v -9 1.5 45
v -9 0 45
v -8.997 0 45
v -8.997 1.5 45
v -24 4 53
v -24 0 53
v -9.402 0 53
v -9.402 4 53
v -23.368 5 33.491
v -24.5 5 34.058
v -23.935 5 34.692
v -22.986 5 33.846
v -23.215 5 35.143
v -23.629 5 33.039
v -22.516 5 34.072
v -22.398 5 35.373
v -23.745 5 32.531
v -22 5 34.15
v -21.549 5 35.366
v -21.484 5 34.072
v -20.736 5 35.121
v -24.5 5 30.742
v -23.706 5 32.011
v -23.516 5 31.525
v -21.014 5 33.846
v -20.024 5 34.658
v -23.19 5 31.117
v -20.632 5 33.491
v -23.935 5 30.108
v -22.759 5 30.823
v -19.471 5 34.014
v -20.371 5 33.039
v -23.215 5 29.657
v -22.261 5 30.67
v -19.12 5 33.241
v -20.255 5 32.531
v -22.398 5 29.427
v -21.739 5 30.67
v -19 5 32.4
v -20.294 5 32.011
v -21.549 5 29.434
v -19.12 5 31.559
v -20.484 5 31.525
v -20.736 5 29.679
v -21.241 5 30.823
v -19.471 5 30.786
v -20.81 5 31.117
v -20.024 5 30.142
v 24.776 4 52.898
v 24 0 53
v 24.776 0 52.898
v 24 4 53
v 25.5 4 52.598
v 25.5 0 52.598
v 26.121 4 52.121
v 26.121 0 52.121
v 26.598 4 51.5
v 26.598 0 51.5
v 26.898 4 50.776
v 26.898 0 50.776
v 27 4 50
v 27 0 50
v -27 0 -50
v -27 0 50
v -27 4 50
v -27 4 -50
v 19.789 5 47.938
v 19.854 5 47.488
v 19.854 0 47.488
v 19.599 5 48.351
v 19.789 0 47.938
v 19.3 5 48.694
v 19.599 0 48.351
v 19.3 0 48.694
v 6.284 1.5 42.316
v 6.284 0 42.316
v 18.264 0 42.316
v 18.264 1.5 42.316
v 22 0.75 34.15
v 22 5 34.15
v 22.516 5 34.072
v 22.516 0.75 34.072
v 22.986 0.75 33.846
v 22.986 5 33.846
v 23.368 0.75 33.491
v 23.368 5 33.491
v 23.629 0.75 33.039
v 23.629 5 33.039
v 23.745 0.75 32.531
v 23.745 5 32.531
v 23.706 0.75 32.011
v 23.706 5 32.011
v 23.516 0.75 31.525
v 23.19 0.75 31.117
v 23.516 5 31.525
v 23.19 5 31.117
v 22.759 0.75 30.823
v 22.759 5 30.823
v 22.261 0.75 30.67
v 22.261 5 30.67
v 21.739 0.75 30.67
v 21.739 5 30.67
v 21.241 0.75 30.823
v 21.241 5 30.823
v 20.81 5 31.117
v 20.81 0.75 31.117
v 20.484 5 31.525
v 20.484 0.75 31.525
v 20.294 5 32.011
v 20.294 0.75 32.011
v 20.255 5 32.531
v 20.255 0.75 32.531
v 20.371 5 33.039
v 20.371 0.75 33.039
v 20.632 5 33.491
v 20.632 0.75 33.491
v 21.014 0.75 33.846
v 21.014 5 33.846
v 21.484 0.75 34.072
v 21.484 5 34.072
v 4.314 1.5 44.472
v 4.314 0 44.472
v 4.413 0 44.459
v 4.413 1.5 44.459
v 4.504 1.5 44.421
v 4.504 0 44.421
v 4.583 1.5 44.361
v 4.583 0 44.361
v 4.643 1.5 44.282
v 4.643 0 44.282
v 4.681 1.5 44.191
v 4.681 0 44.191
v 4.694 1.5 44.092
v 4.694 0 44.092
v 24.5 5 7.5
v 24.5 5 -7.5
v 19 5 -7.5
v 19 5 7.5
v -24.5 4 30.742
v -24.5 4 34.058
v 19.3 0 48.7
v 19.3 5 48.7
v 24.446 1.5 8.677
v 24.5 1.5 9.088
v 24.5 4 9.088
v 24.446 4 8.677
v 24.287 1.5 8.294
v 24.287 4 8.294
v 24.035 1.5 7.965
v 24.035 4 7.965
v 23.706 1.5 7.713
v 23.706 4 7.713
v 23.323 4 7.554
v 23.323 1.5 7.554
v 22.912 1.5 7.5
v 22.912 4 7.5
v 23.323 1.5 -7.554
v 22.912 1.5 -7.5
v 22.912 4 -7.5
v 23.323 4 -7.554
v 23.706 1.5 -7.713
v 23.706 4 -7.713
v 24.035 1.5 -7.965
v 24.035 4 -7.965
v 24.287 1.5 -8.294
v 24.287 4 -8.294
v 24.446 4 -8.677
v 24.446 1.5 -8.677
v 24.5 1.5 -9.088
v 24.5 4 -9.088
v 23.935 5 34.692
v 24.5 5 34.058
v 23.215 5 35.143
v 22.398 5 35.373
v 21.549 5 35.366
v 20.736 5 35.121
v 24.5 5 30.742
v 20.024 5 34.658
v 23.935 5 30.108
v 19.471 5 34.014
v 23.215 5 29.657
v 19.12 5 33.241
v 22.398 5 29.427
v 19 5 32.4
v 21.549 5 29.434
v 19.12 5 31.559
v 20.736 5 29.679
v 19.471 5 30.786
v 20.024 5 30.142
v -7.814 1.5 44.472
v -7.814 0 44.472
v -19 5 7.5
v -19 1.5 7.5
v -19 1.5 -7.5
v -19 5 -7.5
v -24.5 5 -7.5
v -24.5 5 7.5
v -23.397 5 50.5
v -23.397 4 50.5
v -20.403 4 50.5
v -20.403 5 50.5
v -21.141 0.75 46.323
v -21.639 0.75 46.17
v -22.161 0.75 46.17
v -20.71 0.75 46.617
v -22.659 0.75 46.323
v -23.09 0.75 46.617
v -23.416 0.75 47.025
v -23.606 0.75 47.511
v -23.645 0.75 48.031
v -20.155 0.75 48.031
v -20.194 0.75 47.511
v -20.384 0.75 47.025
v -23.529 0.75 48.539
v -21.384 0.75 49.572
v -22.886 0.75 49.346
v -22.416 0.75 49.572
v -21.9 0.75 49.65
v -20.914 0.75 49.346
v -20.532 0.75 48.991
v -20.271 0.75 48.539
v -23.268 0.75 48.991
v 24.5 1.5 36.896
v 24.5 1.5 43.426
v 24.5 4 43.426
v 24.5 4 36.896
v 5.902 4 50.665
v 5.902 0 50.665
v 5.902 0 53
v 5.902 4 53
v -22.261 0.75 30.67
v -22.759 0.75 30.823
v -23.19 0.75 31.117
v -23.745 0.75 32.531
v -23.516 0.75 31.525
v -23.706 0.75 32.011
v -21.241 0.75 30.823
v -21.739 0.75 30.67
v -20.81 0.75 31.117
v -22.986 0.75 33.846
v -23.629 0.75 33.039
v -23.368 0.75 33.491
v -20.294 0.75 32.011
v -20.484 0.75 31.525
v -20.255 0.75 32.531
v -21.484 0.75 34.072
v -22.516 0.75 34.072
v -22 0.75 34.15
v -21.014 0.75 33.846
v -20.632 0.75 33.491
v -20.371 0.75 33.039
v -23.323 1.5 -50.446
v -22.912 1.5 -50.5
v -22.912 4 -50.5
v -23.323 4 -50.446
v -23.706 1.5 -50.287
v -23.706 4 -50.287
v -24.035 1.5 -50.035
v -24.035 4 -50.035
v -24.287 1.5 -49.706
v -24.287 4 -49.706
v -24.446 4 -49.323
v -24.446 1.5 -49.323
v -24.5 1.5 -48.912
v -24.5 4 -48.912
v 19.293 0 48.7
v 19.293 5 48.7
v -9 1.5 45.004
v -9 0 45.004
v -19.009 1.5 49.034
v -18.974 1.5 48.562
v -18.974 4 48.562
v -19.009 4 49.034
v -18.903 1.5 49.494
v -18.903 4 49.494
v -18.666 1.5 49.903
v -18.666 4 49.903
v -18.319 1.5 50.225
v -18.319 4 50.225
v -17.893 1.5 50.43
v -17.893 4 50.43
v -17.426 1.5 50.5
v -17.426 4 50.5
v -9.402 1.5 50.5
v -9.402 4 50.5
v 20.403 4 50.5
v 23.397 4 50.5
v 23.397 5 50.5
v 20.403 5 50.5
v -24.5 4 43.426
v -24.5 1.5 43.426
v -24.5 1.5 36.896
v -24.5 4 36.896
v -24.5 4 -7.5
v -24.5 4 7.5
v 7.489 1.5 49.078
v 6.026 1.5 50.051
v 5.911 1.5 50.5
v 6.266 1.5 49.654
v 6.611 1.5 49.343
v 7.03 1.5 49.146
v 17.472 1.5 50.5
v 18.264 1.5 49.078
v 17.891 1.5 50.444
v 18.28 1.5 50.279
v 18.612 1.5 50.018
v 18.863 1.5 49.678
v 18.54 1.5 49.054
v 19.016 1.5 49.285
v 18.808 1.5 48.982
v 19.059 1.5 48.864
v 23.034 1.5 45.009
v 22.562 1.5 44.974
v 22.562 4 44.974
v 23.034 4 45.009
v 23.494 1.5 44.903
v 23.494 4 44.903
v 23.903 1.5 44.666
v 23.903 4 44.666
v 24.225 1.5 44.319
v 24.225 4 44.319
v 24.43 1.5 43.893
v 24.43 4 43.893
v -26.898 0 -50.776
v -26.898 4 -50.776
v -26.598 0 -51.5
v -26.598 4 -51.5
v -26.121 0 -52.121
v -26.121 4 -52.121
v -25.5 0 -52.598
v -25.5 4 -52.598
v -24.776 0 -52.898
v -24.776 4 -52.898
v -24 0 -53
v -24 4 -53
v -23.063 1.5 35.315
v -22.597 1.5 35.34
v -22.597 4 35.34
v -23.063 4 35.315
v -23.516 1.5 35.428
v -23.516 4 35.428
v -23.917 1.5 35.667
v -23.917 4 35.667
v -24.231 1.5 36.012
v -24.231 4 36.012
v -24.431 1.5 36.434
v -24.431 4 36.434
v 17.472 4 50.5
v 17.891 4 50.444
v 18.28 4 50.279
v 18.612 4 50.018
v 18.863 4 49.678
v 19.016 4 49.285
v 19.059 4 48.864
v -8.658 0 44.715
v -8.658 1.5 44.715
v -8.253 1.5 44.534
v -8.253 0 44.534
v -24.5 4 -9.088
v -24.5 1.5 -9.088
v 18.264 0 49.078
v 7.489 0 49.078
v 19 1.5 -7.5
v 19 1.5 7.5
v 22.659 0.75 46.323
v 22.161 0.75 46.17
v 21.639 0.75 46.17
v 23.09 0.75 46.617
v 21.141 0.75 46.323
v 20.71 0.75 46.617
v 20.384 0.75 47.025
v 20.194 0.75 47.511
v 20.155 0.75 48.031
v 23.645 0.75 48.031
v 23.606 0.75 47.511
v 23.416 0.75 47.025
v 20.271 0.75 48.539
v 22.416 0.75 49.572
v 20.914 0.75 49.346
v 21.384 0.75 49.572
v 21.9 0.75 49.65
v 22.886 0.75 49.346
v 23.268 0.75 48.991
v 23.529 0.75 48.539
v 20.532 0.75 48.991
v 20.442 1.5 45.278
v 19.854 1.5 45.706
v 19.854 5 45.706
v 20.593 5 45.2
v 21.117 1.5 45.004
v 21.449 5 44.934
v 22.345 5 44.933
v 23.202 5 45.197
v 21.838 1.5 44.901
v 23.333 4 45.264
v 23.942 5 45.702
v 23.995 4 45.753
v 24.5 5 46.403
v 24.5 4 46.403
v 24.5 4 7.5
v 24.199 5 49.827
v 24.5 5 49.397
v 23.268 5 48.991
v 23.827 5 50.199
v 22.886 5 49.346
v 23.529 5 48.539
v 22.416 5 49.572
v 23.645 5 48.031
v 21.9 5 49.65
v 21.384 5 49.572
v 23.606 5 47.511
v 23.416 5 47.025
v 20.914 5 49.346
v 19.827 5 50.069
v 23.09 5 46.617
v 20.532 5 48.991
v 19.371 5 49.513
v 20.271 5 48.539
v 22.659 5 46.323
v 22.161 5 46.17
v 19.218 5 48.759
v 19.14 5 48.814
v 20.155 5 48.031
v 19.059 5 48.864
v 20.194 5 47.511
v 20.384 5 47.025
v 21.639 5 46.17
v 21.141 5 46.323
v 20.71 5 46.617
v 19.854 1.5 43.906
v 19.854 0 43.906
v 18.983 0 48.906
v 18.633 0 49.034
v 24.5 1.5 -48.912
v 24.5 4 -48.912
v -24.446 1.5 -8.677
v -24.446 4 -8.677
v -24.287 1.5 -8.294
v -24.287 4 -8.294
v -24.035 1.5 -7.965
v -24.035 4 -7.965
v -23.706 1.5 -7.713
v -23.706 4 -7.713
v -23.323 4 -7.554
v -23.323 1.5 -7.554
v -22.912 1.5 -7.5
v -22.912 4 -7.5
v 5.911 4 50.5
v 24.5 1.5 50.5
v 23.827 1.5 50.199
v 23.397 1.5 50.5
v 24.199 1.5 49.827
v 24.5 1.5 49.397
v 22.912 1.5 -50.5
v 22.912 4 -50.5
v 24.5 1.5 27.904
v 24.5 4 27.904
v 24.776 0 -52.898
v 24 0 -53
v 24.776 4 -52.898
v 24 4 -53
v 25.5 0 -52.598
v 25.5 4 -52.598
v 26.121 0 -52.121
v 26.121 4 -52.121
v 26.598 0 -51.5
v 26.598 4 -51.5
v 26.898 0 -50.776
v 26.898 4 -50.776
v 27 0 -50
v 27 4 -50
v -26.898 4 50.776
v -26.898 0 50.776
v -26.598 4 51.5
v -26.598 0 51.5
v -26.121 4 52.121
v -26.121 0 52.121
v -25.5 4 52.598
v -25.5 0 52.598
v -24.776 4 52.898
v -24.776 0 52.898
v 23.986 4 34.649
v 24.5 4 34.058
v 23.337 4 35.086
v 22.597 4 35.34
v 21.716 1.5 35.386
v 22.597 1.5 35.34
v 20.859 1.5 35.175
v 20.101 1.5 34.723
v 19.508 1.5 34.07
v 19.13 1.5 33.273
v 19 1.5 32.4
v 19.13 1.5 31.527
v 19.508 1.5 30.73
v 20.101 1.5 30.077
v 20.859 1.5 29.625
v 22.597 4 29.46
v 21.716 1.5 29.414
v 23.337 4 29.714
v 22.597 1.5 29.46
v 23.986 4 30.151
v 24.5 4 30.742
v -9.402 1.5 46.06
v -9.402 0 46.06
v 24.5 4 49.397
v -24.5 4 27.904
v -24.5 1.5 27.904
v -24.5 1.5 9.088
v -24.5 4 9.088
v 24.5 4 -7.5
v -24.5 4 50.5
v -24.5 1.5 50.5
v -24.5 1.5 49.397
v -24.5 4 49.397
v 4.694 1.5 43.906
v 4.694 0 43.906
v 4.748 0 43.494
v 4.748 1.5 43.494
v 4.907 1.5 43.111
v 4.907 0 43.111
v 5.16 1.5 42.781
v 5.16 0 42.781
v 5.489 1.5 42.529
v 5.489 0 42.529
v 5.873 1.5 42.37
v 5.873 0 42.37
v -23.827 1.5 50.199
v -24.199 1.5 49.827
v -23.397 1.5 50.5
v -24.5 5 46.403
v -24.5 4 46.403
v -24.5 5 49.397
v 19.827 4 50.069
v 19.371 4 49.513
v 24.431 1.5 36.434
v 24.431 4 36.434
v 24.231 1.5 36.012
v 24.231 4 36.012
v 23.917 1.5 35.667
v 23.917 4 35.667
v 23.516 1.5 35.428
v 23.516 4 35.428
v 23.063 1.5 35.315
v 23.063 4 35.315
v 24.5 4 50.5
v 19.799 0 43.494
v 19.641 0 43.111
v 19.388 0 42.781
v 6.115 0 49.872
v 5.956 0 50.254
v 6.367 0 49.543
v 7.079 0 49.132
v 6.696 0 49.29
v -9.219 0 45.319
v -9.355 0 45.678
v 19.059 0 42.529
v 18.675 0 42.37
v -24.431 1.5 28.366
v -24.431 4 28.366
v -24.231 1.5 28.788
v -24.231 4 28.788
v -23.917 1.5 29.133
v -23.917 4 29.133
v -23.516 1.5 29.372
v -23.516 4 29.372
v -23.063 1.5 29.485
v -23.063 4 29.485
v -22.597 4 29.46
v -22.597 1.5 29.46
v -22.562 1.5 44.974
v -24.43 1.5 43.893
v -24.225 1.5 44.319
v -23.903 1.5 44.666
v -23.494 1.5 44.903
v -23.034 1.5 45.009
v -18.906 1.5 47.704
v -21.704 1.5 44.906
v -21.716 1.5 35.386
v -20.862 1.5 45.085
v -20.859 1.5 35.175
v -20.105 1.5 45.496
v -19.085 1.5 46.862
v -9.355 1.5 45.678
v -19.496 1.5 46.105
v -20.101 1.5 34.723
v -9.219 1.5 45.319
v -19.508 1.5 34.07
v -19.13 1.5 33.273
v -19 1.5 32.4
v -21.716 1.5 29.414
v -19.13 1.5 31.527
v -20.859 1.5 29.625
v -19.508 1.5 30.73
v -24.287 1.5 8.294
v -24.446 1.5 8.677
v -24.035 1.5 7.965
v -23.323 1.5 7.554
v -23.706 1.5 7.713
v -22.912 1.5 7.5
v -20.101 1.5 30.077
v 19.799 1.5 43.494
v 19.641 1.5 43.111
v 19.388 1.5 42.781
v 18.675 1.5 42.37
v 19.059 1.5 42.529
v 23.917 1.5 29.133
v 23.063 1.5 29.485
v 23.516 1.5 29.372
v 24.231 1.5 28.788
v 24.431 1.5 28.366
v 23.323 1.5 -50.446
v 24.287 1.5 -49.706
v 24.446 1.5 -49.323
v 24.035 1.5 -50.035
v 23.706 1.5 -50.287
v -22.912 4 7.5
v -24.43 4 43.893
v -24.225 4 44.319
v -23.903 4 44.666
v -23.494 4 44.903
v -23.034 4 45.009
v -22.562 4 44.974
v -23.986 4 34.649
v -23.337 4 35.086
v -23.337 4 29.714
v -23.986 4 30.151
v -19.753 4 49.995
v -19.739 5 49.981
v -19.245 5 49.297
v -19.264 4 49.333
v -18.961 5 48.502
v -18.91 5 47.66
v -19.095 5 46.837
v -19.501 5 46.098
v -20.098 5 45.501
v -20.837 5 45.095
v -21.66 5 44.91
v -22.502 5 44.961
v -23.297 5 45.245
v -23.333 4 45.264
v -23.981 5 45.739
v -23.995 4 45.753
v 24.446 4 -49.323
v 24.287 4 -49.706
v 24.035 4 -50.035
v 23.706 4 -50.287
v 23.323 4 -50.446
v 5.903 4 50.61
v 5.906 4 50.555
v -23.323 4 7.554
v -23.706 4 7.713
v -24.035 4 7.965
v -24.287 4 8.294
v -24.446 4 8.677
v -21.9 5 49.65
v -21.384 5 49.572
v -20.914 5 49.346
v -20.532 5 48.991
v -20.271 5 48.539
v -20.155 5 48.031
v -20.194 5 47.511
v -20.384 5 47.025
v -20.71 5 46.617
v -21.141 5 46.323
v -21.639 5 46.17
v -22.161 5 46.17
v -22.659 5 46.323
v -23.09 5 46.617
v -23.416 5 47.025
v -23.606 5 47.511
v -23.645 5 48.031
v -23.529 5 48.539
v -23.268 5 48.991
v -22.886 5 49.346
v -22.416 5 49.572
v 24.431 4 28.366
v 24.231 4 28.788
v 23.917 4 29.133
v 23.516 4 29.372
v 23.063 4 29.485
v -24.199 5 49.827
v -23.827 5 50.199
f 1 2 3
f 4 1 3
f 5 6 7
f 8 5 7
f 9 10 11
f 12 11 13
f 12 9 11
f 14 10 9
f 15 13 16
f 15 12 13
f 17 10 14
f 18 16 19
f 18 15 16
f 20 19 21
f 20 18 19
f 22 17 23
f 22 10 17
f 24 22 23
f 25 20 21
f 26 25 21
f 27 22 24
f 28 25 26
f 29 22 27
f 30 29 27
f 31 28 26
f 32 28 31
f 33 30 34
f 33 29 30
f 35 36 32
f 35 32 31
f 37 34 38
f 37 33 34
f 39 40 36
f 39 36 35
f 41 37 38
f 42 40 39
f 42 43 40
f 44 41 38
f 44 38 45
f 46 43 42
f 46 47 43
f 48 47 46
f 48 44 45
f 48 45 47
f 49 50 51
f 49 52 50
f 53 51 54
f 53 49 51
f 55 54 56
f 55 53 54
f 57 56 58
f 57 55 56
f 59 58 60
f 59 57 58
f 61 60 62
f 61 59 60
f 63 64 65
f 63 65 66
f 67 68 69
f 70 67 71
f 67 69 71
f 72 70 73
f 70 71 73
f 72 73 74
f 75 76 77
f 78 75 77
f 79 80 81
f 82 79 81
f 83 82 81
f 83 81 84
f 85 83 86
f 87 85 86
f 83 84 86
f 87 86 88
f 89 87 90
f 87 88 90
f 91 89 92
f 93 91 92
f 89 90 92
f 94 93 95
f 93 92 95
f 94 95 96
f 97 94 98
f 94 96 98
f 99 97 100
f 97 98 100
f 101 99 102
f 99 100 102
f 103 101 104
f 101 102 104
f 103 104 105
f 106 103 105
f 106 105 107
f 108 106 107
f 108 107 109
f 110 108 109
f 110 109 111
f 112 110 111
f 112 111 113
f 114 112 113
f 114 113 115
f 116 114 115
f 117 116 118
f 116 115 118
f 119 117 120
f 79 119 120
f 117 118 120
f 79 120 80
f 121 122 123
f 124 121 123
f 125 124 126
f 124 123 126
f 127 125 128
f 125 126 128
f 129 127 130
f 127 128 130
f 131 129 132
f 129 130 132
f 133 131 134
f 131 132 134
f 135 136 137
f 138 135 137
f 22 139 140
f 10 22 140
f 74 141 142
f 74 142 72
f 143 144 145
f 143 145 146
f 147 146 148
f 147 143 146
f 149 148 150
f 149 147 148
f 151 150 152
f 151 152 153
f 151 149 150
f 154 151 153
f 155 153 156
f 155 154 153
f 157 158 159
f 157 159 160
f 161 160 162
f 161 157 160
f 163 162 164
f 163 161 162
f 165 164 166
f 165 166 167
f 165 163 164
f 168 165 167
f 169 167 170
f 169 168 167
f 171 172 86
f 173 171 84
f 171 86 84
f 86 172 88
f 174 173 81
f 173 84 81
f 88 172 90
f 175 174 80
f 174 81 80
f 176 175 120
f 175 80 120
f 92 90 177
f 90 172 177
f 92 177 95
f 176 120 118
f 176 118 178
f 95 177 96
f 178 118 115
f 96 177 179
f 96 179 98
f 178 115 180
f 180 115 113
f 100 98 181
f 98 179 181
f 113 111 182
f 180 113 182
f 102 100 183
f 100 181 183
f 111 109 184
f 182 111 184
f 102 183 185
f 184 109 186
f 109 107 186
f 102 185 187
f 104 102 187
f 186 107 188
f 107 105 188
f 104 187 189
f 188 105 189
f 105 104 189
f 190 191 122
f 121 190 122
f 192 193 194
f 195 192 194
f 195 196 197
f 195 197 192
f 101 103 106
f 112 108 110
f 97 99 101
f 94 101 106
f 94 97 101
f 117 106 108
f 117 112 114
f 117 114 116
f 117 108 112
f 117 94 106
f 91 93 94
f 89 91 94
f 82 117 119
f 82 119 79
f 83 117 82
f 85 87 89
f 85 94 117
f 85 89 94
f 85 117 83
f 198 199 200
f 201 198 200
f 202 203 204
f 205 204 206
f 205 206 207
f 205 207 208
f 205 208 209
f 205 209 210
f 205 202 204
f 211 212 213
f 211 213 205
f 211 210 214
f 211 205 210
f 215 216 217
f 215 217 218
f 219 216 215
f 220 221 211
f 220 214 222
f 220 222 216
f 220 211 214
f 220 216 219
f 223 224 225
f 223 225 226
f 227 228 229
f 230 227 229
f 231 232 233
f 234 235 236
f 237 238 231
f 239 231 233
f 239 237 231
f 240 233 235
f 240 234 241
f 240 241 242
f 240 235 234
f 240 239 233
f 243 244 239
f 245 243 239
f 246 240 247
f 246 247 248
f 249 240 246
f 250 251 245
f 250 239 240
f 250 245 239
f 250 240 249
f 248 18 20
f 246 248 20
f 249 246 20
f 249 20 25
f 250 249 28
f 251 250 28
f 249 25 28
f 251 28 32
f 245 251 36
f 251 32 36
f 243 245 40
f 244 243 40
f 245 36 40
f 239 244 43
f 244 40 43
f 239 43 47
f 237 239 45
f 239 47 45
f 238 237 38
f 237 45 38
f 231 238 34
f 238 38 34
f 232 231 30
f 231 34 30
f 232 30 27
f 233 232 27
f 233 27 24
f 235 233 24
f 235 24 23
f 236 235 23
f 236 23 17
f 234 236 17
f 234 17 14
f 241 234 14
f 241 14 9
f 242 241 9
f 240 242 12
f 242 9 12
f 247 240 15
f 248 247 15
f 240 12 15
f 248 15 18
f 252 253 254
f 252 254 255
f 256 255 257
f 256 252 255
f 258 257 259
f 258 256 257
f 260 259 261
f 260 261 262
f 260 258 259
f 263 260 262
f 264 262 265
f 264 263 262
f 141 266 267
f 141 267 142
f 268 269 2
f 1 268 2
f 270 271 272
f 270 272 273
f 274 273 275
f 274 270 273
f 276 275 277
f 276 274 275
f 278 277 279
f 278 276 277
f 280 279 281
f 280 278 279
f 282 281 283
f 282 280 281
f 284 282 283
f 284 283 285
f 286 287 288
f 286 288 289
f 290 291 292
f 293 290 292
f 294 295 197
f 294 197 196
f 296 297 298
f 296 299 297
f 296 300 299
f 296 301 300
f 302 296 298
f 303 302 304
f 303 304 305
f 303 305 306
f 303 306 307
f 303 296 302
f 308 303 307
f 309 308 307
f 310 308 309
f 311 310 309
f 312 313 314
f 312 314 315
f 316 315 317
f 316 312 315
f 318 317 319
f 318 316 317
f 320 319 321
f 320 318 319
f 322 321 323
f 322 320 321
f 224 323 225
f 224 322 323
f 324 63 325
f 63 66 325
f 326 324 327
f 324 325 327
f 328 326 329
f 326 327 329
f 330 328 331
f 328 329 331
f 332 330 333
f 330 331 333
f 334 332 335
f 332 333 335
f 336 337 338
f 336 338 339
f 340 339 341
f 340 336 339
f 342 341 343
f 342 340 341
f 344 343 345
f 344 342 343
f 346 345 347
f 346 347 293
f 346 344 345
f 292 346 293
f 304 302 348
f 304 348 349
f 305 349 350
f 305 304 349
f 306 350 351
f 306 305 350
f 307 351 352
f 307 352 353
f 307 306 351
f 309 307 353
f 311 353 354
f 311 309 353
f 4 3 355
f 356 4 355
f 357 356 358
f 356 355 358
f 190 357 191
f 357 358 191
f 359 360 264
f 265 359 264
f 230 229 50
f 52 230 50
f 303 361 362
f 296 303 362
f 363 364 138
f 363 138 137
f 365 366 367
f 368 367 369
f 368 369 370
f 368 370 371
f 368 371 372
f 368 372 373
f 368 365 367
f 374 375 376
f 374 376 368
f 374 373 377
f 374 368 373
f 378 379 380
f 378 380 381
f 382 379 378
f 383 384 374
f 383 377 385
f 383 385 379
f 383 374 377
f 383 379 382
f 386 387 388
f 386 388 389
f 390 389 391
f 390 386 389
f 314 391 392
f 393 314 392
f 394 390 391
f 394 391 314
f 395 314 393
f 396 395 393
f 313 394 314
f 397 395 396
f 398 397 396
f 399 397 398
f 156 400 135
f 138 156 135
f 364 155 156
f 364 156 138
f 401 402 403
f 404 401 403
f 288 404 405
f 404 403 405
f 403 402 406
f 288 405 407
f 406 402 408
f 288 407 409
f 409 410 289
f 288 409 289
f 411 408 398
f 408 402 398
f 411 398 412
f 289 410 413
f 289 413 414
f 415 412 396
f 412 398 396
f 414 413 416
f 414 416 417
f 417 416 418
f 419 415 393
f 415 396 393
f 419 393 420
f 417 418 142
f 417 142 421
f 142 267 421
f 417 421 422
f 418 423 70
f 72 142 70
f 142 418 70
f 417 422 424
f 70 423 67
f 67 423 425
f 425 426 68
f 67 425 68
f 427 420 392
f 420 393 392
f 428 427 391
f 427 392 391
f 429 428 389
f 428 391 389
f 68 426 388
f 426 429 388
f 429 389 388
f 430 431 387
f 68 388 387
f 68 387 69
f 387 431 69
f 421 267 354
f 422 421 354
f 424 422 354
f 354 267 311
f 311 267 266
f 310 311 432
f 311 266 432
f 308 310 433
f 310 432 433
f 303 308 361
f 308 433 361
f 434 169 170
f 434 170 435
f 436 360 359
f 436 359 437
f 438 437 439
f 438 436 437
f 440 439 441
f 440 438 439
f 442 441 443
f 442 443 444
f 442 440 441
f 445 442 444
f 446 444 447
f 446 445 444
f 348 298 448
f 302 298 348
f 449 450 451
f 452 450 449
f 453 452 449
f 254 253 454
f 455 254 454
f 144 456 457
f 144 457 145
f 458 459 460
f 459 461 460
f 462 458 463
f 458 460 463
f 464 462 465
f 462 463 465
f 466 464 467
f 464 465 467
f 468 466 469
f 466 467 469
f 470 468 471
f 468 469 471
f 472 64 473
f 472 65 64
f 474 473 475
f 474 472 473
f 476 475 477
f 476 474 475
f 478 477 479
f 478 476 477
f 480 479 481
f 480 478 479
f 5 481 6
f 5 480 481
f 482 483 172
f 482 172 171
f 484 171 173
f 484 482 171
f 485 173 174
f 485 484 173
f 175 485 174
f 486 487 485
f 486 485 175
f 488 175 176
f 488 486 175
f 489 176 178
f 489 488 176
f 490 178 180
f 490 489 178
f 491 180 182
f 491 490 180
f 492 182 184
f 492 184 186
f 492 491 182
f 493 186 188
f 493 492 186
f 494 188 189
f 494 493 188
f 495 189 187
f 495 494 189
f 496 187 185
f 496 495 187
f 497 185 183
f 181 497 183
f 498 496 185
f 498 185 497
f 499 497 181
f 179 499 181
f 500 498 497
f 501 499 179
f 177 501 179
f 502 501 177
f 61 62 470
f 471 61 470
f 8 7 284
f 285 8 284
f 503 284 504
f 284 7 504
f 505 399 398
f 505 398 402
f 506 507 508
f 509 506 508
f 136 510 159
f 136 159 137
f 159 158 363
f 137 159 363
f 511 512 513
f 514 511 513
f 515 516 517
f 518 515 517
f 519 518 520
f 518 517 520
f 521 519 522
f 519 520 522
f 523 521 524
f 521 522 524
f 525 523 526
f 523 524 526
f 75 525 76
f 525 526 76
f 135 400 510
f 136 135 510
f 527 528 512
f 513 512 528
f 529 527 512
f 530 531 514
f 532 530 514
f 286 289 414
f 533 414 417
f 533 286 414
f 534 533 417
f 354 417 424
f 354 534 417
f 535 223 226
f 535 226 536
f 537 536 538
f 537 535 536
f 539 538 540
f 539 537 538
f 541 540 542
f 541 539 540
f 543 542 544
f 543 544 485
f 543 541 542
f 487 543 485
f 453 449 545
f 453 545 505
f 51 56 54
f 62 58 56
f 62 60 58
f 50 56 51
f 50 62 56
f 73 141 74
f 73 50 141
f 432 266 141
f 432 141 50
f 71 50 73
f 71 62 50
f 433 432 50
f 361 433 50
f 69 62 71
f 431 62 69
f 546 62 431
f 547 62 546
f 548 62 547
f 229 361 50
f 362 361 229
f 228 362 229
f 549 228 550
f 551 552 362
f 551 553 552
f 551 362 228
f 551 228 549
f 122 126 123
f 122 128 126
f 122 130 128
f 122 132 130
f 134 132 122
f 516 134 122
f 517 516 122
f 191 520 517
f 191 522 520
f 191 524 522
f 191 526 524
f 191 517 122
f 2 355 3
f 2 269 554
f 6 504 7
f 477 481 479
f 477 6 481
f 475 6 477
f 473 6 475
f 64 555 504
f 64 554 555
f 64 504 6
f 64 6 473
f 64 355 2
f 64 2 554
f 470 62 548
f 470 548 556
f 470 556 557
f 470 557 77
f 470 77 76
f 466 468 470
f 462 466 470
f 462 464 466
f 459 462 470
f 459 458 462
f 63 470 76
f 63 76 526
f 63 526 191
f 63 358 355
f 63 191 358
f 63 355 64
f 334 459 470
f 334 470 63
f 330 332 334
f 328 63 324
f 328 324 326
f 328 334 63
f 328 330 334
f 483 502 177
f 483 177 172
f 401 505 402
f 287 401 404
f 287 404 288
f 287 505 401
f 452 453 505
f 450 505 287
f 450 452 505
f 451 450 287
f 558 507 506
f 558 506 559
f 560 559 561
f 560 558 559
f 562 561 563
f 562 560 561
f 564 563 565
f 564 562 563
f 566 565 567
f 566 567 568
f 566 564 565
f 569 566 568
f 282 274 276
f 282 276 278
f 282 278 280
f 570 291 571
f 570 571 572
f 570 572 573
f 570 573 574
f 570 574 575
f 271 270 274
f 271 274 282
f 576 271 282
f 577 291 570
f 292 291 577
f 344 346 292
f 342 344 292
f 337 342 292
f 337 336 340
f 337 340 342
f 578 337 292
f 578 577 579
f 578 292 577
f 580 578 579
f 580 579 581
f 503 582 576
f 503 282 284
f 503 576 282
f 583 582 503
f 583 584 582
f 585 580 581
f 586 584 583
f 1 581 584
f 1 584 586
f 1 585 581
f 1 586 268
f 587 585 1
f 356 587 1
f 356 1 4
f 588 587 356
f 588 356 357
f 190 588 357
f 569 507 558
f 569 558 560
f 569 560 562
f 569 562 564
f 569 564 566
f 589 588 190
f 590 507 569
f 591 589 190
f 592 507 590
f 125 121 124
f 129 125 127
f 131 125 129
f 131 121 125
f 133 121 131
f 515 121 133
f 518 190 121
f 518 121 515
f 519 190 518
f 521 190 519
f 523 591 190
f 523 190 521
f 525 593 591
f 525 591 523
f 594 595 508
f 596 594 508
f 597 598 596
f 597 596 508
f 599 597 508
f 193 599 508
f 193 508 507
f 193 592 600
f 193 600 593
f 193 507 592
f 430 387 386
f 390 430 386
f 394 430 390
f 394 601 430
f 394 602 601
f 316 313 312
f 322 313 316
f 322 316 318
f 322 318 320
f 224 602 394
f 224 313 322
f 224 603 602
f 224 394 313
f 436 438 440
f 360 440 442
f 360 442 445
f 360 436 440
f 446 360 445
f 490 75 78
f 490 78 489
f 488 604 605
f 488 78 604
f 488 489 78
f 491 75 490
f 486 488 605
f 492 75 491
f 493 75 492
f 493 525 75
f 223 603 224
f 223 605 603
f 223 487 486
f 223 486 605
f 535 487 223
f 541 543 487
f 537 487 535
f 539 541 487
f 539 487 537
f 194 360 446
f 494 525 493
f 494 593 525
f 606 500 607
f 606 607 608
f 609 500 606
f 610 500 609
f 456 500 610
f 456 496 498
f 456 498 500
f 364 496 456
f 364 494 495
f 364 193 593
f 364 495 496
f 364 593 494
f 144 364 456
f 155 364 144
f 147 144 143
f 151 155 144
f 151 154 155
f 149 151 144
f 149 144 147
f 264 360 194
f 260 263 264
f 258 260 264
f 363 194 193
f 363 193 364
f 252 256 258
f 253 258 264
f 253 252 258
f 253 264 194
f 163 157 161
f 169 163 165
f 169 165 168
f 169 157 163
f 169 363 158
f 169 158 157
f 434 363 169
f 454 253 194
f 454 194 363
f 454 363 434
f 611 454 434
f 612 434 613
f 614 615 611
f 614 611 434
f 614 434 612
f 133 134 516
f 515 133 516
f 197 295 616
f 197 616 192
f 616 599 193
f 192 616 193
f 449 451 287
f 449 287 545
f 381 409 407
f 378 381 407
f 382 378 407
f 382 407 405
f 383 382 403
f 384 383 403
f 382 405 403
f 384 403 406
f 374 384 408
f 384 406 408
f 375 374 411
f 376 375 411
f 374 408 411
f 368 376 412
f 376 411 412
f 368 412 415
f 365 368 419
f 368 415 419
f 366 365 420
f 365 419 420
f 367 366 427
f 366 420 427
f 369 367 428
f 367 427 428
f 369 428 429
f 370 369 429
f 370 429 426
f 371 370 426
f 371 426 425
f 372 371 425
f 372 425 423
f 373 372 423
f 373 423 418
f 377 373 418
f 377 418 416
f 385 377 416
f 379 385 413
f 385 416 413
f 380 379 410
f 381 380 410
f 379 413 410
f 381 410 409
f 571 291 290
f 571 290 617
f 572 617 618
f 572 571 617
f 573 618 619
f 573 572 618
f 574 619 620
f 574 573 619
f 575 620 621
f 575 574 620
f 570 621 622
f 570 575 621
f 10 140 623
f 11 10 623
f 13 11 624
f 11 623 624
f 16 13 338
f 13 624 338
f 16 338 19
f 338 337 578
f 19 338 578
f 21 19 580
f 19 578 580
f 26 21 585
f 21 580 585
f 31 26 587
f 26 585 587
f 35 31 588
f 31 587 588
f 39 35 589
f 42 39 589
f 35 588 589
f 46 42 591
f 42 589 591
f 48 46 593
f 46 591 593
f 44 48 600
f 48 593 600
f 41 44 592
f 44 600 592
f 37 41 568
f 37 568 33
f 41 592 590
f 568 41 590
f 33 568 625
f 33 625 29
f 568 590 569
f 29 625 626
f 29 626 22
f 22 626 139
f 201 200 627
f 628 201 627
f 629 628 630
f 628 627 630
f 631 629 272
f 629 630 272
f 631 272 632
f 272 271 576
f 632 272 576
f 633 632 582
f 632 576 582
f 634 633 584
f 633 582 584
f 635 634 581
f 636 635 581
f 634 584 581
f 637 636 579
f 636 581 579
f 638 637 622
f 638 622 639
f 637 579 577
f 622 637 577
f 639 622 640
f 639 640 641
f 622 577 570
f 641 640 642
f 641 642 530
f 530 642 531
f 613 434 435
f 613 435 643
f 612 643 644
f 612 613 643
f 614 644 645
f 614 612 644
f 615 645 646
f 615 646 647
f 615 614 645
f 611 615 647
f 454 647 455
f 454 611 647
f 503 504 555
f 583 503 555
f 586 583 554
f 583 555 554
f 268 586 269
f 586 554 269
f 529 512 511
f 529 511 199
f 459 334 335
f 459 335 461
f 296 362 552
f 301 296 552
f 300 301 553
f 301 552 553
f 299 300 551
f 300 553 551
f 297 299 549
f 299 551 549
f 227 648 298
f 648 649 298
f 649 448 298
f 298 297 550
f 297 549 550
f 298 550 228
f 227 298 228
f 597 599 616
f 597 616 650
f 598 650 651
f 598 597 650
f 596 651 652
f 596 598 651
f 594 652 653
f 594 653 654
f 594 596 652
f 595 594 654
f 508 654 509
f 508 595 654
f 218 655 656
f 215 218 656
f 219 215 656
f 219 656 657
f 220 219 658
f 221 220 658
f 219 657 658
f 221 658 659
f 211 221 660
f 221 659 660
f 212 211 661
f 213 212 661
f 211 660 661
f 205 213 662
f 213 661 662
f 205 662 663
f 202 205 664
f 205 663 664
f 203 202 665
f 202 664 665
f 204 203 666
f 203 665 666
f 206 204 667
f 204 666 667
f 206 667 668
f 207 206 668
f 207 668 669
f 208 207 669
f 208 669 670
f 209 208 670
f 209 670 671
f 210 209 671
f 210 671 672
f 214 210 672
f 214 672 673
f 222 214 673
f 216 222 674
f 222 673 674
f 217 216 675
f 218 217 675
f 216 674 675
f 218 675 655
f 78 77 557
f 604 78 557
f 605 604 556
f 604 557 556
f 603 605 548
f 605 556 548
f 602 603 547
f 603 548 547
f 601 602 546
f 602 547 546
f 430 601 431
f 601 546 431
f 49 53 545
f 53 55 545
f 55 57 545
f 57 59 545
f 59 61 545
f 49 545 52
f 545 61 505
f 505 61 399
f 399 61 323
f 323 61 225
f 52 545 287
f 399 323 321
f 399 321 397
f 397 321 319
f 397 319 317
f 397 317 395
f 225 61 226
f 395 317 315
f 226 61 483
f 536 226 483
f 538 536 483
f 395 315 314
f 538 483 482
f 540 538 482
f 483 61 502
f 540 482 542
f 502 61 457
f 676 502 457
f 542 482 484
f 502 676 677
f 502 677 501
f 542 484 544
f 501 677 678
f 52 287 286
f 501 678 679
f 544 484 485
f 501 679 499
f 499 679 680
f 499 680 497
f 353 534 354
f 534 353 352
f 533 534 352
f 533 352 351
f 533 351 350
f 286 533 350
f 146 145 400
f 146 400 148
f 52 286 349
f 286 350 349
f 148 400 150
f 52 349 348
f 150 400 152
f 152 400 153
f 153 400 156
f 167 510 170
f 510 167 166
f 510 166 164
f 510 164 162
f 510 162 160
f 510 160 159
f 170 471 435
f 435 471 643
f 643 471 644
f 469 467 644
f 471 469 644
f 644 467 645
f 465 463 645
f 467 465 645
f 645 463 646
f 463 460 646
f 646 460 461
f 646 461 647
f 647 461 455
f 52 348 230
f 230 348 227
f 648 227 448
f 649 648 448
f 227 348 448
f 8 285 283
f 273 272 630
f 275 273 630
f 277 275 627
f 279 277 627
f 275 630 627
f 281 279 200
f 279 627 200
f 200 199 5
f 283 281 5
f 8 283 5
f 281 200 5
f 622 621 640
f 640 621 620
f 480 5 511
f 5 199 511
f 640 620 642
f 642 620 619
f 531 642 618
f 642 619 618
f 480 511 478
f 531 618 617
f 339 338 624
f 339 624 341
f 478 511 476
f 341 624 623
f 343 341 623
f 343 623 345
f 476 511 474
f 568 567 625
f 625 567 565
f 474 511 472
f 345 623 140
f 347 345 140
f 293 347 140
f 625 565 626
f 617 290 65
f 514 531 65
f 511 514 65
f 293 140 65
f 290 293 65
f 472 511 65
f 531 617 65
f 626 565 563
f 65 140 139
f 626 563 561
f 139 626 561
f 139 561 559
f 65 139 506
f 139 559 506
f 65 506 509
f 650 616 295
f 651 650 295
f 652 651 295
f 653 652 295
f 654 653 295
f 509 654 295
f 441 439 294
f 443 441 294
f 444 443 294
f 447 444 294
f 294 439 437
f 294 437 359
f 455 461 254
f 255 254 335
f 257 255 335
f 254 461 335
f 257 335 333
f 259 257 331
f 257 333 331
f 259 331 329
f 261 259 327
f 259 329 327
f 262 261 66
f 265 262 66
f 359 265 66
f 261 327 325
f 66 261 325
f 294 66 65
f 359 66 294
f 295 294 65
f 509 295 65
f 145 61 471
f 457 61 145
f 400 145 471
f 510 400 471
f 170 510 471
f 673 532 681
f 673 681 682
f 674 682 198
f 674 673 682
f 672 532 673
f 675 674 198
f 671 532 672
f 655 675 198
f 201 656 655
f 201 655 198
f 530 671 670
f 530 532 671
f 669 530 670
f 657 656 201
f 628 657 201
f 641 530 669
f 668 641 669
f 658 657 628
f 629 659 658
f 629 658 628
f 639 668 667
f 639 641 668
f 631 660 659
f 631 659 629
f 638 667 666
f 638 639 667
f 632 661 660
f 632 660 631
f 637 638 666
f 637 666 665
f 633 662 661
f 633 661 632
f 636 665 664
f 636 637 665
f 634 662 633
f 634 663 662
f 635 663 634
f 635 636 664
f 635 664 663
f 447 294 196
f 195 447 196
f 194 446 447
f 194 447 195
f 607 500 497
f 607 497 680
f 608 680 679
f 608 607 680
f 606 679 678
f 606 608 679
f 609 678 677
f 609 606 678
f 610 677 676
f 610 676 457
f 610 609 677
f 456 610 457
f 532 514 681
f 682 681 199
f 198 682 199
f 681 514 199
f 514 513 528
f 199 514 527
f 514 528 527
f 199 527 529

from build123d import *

# Parameters (mm, degrees)
SKETCH1_W           = 49
SKETCH1_H           = 101
BOSS_EXTRUDE1_DEPTH = 1.5
SKETCH2_W           = 54
SKETCH2_H           = 106
SKETCH2_W_2         = 49
SKETCH2_H_2         = 101
BOSS_EXTRUDE2_DEPTH = 4
SKETCH3_W           = 5.5
SKETCH3_H           = 15
BOSS_EXTRUDE3_DEPTH = 5
SKETCH4_R           = 1.75
CUT_EXTRUDE1_DEPTH  = 4.25
SKETCH5_R           = 1.75
CUT_EXTRUDE2_DEPTH  = 4.25
SKETCH6_W           = 14.5
SKETCH6_H           = 7.3
CUT_EXTRUDE3_DEPTH  = 60.690870324
SKETCH7_W           = 13.8
SKETCH7_H           = 6
CUT_EXTRUDE4_DEPTH  = 60.690870324
FILLET1_R           = 3
CUT_EXTRUDE5_DEPTH  = 60.690870324
FILLET2_R           = 1.5875


with BuildPart() as part:
    # Sketch1 → Boss-Extrude1 (new body)
    with BuildSketch(Plane(origin=(0, 0, 0), x_dir=(1, 0, 0), z_dir=(0, 1, 0))):
        Rectangle(SKETCH1_W, SKETCH1_H)
    extrude(amount=BOSS_EXTRUDE1_DEPTH)

    # Sketch2 → Boss-Extrude2 (add)
    with BuildSketch(Plane(origin=(0, 0, 0), x_dir=(1, 0, 0), z_dir=(0, 1, 0))):
        Rectangle(SKETCH2_W, SKETCH2_H)
        Rectangle(SKETCH2_W_2, SKETCH2_H_2, mode=Mode.SUBTRACT)
    extrude(amount=BOSS_EXTRUDE2_DEPTH)

    # Sketch3 → Boss-Extrude3 (add)
    with BuildSketch(Plane(origin=(0, 0, 0), x_dir=(1, 0, 0), z_dir=(0, 1, 0))):
        with BuildLine():
            Line((-24.5, -30.741687605), (-24.5, -34.058312395))
            ThreePointArc((-24.5, -34.058312395), (-19, -32.4), (-24.5, -30.741687605))
        make_face()
        with Locations((-21.75, 0)):
            Rectangle(SKETCH3_W, SKETCH3_H)
        with BuildLine():
            Line((-24.5, -46.403337045), (-24.5, -49.396662955))
            ThreePointArc((-24.5, -49.396662955), (-24.021320344, -50.021320344), (-23.396662955, -50.5))
            Line((-23.396662955, -50.5), (-20.403337045, -50.5))
            ThreePointArc((-20.403337045, -50.5), (-19.778679656, -45.778679656), (-24.5, -46.403337045))
        make_face()
    boss_extrude3 = extrude(amount=BOSS_EXTRUDE3_DEPTH)

    # Mirror1: Boss-Extrude3 across plane
    add(boss_extrude3.mirror(Plane(origin=(0, 0, 0), x_dir=(0, 0, 1), z_dir=(1, 0, 0))))

    # Sketch4 → Cut-Extrude1 (cut)
    with BuildSketch(Plane(origin=(0, 5, 0), x_dir=(1, 0, 0), z_dir=(0, 1, 0))):
        with Locations(Location((-21.9, -47.9, 0), (0, 0, 270))):
            Circle(SKETCH4_R)
        with Locations(Location((21.9, -47.9, 0), (0, 0, 270))):
            Circle(SKETCH4_R)
    extrude(amount=-CUT_EXTRUDE1_DEPTH, mode=Mode.SUBTRACT)

    # Sketch5 → Cut-Extrude2 (cut)
    with BuildSketch(Plane(origin=(0, 5, 0), x_dir=(1, 0, 0), z_dir=(0, 1, 0))):
        with Locations(Location((-22, -32.4, 0), (0, 0, 270))):
            Circle(SKETCH5_R)
        with Locations(Location((22, -32.4, 0), (0, 0, 270))):
            Circle(SKETCH5_R)
    extrude(amount=-CUT_EXTRUDE2_DEPTH, mode=Mode.SUBTRACT)

    # Sketch6 → Cut-Extrude3 (cut, through all)
    with BuildSketch(Plane(origin=(0, 0, 0), x_dir=(1, 0, 0), z_dir=(0, 1, 0))):
        with Locations((-1.75, -48.65)):
            Rectangle(SKETCH6_W, SKETCH6_H)
    extrude(amount=CUT_EXTRUDE3_DEPTH, mode=Mode.SUBTRACT)

    # Sketch7 → Cut-Extrude4 (cut, through all)
    with BuildSketch(Plane(origin=(0, 0, 0), x_dir=(1, 0, 0), z_dir=(0, 1, 0))):
        with Locations((12.4, -45.7)):
            Rectangle(SKETCH7_W, SKETCH7_H)
    extrude(amount=CUT_EXTRUDE4_DEPTH, mode=Mode.SUBTRACT)

    # Fillet1
    fillet1_edges = [part.edges().sort_by_distance(p)[0] for p in [
        (-27, 2, 53),
        (27, 2, 53),
        (27, 2, -53),
        (-27, 2, -53),
    ]]
    fillet(fillet1_edges, radius=FILLET1_R)

    # Sketch9 → Cut-Extrude5 (cut, through all)
    with BuildSketch(Plane(origin=(0, 0, 0), x_dir=(1, 0, 0), z_dir=(0, 1, 0))):
        with BuildLine():
            Line((-7.814445172, -44.472009202), (4.314445172, -44.472009202))
            ThreePointArc((4.314445172, -44.472009202), (4.582924338, -44.36080149), (4.69413205, -44.092322323))
            Line((4.69413205, -44.092322323), (4.69413205, -43.905796609))
            ThreePointArc((4.69413205, -43.905796609), (5.159832268, -42.781496827), (6.28413205, -42.315796609))
            Line((6.28413205, -42.315796609), (18.263585731, -42.315796609))
            ThreePointArc((18.263585731, -42.315796609), (19.387885513, -42.781496827), (19.853585731, -43.905796609))
            Line((19.853585731, -43.905796609), (19.853585731, -47.487814705))
            ThreePointArc((19.853585731, -47.487814705), (19.387885513, -48.612114487), (18.263585731, -49.077814705))
            Line((18.263585731, -49.077814705), (7.489445172, -49.077814705))
            ThreePointArc((7.489445172, -49.077814705), (6.366913156, -49.54278269), (5.901945172, -50.665314705))
            Line((5.901945172, -50.665314705), (5.901945172, -53))
            Line((5.901945172, -53), (-9.401945172, -53))
            Line((-9.401945172, -53), (-9.401945172, -46.059509202))
            ThreePointArc((-9.401945172, -46.059509202), (-8.936977187, -44.936977187), (-7.814445172, -44.472009202))
        make_face()
    extrude(amount=CUT_EXTRUDE5_DEPTH, mode=Mode.SUBTRACT)

    # Fillet2
    # the kernel refuses this fillet: 1.5875 mm, written as the material it adds along each edge
    with BuildSketch(Plane(origin=(20.403337045, 1.5, 50.5), x_dir=(-0.6349026308265473, 0, -0.7725921623790454), z_dir=(0, 1, 0))) as fillet2_piece_1:
        with BuildLine():
            CenterArc((3.087304614, 1.256456201), FILLET2_R, 140.587236848, 91.735718276)
            Line((1.860814556, 2.264364128), (0, 0))
            ThreePointArc((0, 0), (1.058504375, 0.192943091), (2.11700875, 0))
        make_face()
    extrude(amount=2.5)
    with BuildSketch(Plane(origin=(24.5, 1.5, 46.403337045), x_dir=(-0.8047683960868028, 0, -0.5935889391320183), z_dir=(0, 1, 0))) as fillet2_piece_2:
        with BuildLine():
            CenterArc((3.045104664, -1.45404326), FILLET2_R, 113.661459125, 102.750646884)
            Line((1.767534835, -2.396365701), (0, 0))
            ThreePointArc((0, 0), (1.203995254, -0.252201713), (2.407990509, 0))
        make_face()
    extrude(amount=2.5)
    with BuildSketch(Plane(origin=(24.5, 1.5, 34.058312395), x_dir=(-0.8294476443903582, 0, 0.5585844656050558), z_dir=(0, 1, 0)), Plane(origin=(-24.5, 1.5, 30.741687605), x_dir=(0.8294476443903578, 0, -0.5585844656050566), z_dir=(0, 1, 0))) as fillet2_piece_3:
        with BuildLine():
            CenterArc((2.901742174, 1.466820617), FILLET2_R, 146.042039471, 101.473230821)
            Line((1.584994038, 2.353573457), (0, 0))
            ThreePointArc((0, 0), (1.147311568, 0.228055526), (2.294623136, 0))
        make_face()
    extrude(amount=2.5)
    with BuildSketch(Plane(origin=(24.5, 1.5, 30.741687605), x_dir=(-0.8294476443903573, 0, -0.5585844656050574), z_dir=(0, 1, 0)), Plane(origin=(-24.5, 1.5, 34.058312395), x_dir=(0.8294476443903588, 0, 0.5585844656050553), z_dir=(0, 1, 0))) as fillet2_piece_4:
        with BuildLine():
            CenterArc((2.901742174, -1.466820617), FILLET2_R, 112.484729709, 101.473230821)
            Line((1.584994038, -2.353573457), (0, 0))
            ThreePointArc((0, 0), (1.147311568, -0.228055526), (2.294623136, 0))
        make_face()
    extrude(amount=2.5)
    with BuildSketch(Plane(origin=(24.5, 1.5, -7.5), x_dir=(-1, 0, 0), z_dir=(0, 1, 0)), Plane(origin=(-24.5, 1.5, 7.5), x_dir=(1, 0, 0), z_dir=(0, 1, 0))) as fillet2_piece_5:
        with BuildLine():
            CenterArc((FILLET2_R, -FILLET2_R), FILLET2_R, 90, 90)
            Line((0, -FILLET2_R), (0, 0))
            Line((0, 0), (FILLET2_R, 0))
        make_face()
    extrude(amount=2.5)
    with BuildSketch(Plane(origin=(24.5, 1.5, 7.5), x_dir=(-1, 0, 0), z_dir=(0, 1, 0)), Plane(origin=(24.5, 1.5, -50.5), x_dir=(-1, 0, 0), z_dir=(0, 1, 0)), Plane(origin=(-24.5, 1.5, -50.5), x_dir=(0, 0, 1), z_dir=(0, 1, 0)), Plane(origin=(-24.5, 1.5, -7.5), x_dir=(1, 0, 0), z_dir=(0, 1, 0))) as fillet2_piece_6:
        with BuildLine():
            CenterArc((FILLET2_R, FILLET2_R), FILLET2_R, 180, 90)
            Line((0, FILLET2_R), (0, 0))
            Line((0, 0), (FILLET2_R, 0))
        make_face()
    extrude(amount=2.5)
    with BuildSketch(Plane(origin=(-20.403337045, 1.5, 50.5), x_dir=(1, 0, 0), z_dir=(0, 1, 0))) as fillet2_piece_7:
        with BuildLine():
            CenterArc((2.97770851, 1.5875), FILLET2_R, 167.249353116, 102.750646884)
            ThreePointArc((1.429356531, 1.937874659), (0.917642234, 0.819233183), (0, 0))
            Line((0, 0), (2.97770851, 0))
        make_face()
    extrude(amount=2.5)
    with BuildSketch(Plane(origin=(-24.5, 1.5, 46.403337045), x_dir=(0.8047683960868005, 0, -0.5935889391320214), z_dir=(0, 1, 0))) as fillet2_piece_8:
        with BuildLine():
            CenterArc((3.045104664, 1.45404326), FILLET2_R, 143.587893991, 102.750646884)
            Line((1.767534835, 2.396365701), (0, 0))
            ThreePointArc((0, 0), (1.203995254, 0.252201713), (2.407990509, 0))
        make_face()
    extrude(amount=2.5)


solid = part.part
